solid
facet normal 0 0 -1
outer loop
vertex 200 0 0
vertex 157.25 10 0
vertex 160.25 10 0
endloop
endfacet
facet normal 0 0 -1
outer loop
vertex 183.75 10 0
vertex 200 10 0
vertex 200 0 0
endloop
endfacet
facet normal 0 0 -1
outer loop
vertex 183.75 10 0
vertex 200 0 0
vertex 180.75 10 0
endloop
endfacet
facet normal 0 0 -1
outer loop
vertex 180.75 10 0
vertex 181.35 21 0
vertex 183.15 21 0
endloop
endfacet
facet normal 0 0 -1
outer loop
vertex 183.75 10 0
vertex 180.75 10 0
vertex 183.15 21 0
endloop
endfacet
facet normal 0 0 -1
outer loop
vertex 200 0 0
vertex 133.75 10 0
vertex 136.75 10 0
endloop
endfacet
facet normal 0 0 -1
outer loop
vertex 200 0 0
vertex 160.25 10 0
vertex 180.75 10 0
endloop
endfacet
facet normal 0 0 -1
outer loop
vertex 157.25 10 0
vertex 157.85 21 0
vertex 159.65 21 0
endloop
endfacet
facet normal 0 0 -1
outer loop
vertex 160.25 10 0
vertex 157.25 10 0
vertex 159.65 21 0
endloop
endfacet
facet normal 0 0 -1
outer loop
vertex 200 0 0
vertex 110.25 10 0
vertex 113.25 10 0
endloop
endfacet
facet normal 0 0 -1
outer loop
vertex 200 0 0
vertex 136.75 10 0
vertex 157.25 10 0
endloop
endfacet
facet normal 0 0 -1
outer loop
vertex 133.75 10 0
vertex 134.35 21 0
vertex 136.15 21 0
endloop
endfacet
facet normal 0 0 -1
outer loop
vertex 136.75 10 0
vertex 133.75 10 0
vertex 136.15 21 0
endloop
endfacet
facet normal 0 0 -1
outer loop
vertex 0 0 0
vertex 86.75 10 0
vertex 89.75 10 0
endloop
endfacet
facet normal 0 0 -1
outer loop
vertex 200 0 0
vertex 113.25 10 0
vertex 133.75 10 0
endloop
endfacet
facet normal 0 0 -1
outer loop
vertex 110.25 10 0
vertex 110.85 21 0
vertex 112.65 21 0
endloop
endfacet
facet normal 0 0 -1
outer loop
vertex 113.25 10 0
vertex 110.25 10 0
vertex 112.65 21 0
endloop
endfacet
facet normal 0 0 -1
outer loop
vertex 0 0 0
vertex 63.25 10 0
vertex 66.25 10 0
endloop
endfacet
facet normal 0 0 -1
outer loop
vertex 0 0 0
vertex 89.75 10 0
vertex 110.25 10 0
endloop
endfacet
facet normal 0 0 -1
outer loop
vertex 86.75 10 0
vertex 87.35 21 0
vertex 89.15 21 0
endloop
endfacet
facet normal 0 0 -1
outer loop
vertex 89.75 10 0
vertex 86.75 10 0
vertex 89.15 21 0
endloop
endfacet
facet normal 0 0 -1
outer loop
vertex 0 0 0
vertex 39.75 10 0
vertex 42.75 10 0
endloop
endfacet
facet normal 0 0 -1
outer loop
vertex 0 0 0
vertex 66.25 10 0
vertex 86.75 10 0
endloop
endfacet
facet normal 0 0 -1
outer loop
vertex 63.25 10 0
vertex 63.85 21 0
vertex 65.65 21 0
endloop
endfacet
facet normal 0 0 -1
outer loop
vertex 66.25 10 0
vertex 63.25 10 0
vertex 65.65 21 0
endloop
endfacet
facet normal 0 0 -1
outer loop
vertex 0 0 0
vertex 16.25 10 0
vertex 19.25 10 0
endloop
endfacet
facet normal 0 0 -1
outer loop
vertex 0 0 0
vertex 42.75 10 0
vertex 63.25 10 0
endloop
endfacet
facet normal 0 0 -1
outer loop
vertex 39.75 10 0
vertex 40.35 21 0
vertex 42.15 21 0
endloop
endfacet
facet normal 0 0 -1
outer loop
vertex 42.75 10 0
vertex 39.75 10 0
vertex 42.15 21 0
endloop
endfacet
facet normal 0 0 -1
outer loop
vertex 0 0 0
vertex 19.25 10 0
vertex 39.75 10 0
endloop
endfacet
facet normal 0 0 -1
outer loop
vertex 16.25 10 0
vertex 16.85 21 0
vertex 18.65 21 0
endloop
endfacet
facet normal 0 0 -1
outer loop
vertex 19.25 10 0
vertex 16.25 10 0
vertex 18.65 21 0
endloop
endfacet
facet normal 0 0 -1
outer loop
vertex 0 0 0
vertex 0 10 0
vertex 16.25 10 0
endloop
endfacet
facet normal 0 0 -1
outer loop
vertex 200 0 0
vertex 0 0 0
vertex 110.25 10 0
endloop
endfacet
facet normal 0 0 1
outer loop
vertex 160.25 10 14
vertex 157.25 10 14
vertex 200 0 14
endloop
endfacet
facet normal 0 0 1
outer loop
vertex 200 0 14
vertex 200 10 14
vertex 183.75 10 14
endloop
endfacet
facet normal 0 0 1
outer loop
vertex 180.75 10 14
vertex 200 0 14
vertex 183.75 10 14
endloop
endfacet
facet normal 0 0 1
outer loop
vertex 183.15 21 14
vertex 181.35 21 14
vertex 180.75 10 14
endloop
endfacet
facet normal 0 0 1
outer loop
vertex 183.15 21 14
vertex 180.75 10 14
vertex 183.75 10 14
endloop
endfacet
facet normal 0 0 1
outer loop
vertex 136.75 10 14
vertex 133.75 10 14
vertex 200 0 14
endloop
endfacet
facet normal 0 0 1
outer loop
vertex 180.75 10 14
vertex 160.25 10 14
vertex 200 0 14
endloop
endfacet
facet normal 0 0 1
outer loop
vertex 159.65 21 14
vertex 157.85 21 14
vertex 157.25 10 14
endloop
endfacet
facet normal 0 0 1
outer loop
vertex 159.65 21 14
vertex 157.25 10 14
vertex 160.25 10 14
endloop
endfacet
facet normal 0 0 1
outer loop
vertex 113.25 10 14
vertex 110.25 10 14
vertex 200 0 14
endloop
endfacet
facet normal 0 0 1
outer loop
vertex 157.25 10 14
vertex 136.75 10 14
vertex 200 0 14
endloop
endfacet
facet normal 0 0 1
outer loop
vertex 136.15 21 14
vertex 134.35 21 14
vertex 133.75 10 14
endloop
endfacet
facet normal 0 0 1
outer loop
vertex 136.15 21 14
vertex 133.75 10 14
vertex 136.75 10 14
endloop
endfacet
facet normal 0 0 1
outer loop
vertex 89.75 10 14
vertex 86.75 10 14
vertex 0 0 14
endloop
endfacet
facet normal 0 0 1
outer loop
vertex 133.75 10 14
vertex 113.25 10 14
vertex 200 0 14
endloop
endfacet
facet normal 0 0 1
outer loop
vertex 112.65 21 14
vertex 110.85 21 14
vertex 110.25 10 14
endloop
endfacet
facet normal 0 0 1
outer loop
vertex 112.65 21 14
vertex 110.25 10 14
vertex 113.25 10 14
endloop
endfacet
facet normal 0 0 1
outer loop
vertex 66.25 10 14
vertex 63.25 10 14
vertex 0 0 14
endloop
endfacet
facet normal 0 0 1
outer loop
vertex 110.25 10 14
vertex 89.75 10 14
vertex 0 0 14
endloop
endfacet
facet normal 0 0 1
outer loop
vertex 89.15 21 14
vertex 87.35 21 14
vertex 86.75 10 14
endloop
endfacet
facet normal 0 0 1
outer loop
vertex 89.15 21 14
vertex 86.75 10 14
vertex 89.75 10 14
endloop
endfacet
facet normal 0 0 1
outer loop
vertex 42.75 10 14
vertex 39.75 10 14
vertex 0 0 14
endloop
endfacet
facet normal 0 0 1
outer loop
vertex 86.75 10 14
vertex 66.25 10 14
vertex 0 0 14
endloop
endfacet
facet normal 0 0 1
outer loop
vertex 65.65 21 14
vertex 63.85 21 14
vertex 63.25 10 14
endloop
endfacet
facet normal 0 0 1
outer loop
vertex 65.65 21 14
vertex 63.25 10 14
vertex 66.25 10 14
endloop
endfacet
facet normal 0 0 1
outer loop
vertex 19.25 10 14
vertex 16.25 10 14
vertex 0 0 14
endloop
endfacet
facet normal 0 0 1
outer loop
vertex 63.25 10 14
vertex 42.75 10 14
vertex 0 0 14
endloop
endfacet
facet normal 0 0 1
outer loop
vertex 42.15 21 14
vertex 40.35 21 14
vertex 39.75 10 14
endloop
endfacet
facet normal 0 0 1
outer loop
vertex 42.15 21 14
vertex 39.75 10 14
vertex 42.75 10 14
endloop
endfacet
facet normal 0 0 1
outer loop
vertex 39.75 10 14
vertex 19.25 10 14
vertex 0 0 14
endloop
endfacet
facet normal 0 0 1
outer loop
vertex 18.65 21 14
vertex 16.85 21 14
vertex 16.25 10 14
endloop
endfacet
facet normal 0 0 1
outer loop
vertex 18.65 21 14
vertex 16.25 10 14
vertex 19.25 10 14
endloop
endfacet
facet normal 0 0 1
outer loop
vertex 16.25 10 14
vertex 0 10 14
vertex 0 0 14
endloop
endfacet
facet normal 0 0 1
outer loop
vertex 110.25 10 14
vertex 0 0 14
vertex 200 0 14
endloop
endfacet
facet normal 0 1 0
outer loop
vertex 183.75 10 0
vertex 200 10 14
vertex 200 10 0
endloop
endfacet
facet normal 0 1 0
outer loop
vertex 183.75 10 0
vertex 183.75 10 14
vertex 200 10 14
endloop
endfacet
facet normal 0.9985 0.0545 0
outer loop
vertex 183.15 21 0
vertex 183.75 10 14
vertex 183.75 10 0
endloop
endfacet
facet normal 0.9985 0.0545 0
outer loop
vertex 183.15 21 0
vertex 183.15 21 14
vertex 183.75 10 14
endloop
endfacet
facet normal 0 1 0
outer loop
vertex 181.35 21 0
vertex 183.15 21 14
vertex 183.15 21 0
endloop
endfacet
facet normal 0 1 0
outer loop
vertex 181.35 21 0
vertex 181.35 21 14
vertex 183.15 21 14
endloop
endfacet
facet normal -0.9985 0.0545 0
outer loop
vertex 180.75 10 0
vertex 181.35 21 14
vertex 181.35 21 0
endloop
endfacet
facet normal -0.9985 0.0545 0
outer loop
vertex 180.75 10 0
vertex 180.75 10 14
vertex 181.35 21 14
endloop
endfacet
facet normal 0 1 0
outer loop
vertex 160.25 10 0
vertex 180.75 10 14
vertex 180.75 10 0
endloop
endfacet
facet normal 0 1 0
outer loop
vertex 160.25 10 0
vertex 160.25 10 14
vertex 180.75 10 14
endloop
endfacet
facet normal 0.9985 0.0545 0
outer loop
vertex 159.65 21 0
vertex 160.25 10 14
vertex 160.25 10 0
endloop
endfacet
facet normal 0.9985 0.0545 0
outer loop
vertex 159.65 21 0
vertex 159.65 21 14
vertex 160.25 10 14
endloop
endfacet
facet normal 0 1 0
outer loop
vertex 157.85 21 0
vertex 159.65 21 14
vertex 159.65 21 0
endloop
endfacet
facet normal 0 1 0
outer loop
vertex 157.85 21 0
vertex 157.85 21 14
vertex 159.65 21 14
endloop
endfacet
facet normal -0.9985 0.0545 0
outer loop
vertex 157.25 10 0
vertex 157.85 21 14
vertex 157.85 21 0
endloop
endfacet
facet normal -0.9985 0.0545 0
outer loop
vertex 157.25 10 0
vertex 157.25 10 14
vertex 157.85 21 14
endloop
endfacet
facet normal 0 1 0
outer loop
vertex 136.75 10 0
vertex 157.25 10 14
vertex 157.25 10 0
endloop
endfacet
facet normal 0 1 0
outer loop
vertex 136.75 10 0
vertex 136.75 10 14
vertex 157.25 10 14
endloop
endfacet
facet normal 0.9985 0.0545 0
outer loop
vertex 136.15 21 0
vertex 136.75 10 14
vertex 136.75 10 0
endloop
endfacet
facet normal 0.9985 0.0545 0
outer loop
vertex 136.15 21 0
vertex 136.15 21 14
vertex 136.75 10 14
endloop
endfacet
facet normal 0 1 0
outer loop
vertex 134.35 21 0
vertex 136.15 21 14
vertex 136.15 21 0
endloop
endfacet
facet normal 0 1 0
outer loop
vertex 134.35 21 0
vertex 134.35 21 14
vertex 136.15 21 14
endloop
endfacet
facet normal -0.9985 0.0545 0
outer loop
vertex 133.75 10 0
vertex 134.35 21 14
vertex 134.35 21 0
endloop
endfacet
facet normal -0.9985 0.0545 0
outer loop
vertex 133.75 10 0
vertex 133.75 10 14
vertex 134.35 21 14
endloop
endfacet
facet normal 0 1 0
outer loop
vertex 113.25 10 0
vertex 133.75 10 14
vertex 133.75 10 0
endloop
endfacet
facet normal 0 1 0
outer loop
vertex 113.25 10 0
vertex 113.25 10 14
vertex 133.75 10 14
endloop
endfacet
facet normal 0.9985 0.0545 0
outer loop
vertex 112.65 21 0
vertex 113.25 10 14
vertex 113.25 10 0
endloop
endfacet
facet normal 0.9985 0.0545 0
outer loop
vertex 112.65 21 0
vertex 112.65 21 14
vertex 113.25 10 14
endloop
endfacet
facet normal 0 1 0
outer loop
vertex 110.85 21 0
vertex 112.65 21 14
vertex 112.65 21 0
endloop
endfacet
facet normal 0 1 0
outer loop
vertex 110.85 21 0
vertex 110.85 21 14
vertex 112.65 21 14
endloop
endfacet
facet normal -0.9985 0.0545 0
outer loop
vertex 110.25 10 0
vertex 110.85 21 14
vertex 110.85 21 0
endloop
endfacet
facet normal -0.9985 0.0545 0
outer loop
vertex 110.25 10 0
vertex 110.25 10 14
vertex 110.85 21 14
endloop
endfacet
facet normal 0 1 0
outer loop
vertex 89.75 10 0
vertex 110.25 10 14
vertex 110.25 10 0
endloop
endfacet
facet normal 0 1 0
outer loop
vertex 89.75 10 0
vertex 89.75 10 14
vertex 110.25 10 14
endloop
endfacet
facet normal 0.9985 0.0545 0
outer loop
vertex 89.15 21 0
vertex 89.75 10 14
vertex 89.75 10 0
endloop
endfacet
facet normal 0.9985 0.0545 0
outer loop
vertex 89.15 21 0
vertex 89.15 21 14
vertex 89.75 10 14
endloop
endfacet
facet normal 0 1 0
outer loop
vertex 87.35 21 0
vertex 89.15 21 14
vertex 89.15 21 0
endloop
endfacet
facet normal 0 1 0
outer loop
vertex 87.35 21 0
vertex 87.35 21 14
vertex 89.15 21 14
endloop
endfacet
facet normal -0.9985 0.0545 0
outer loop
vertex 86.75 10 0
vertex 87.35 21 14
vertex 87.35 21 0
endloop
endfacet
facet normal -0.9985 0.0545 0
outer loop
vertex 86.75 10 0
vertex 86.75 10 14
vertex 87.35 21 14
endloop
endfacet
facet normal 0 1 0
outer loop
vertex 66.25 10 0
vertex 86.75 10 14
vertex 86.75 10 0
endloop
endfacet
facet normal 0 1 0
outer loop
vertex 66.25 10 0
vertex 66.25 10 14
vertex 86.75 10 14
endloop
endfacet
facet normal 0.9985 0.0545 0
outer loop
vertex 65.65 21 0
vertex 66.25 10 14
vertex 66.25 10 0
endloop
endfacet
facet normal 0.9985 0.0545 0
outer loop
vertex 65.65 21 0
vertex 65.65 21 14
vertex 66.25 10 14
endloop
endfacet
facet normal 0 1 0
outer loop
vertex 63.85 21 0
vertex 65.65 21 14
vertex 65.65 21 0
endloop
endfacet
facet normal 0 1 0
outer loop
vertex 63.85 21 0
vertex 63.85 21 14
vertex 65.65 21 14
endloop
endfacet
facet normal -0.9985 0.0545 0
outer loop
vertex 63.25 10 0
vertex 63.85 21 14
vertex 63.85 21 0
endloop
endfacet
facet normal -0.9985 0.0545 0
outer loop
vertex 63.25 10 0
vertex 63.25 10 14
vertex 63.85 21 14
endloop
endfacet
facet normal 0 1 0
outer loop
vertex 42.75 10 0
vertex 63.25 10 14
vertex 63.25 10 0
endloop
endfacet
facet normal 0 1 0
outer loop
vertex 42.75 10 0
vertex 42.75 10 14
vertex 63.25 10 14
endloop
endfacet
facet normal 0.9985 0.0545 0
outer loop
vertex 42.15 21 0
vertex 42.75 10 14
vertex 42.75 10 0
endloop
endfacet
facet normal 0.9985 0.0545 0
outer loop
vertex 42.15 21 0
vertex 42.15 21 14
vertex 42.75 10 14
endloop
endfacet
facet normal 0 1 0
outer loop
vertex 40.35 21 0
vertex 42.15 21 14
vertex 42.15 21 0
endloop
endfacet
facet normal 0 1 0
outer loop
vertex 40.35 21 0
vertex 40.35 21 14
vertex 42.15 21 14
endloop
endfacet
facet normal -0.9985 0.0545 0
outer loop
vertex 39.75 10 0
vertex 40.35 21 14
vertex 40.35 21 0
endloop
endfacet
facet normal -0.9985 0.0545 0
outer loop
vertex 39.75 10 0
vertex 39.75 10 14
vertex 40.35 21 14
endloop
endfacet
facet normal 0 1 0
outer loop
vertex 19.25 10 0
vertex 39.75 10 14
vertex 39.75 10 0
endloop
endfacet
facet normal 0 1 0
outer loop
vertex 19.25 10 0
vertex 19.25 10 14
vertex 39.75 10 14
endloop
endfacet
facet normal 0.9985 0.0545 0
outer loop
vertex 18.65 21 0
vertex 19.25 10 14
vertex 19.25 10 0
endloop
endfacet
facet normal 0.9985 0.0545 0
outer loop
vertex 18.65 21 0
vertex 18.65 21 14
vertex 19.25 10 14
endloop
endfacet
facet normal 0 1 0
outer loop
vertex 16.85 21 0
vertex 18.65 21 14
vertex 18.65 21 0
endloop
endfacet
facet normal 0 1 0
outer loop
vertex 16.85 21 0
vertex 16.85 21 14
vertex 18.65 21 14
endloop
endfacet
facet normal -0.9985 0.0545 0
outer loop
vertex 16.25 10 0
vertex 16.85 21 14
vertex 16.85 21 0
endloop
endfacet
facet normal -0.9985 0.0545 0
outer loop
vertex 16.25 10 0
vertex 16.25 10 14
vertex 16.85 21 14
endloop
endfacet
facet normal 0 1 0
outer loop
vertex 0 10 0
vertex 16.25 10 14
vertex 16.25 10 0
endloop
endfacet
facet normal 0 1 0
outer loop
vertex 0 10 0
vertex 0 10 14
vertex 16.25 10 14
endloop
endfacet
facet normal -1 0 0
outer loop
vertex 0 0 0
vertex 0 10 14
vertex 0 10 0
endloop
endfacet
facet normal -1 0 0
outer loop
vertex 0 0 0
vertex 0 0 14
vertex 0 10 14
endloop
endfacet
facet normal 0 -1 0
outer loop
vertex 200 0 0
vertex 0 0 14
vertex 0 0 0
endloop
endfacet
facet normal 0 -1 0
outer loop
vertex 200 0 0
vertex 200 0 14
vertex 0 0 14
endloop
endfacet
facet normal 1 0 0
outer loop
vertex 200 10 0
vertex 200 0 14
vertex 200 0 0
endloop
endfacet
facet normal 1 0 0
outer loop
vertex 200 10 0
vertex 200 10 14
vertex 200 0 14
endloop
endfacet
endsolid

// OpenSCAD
$fn = 32;

// ----------------------------------------------------------------------
// Gear rack: 8 teeth on a 200 mm bar, pitch 23.5 mm
// ----------------------------------------------------------------------

// --- parameters (mm) ---
profile_height = 14;      // extrusion height
profile_points = 36;      // points of the closed outline

profile = [[0, 0], [200, 0], [200, 10], [183.75, 10], [183.15, 21], [181.35, 21], [180.75, 10], [160.25, 10], [159.65, 21], [157.85, 21], [157.25, 10], [136.75, 10], [136.15, 21], [134.35, 21], [133.75, 10], [113.25, 10], [112.65, 21], [110.85, 21], [110.25, 10], [89.75, 10], [89.15, 21], [87.35, 21], [86.75, 10], [66.25, 10], [65.65, 21], [63.85, 21], [63.25, 10], [42.75, 10], [42.15, 21], [40.35, 21], [39.75, 10], [19.25, 10], [18.65, 21], [16.85, 21], [16.25, 10], [0, 10]];  // single closed polygon, 36 points, counter clockwise

// --- the one profile operation ---
linear_extrude(height = profile_height) polygon(points = profile);
